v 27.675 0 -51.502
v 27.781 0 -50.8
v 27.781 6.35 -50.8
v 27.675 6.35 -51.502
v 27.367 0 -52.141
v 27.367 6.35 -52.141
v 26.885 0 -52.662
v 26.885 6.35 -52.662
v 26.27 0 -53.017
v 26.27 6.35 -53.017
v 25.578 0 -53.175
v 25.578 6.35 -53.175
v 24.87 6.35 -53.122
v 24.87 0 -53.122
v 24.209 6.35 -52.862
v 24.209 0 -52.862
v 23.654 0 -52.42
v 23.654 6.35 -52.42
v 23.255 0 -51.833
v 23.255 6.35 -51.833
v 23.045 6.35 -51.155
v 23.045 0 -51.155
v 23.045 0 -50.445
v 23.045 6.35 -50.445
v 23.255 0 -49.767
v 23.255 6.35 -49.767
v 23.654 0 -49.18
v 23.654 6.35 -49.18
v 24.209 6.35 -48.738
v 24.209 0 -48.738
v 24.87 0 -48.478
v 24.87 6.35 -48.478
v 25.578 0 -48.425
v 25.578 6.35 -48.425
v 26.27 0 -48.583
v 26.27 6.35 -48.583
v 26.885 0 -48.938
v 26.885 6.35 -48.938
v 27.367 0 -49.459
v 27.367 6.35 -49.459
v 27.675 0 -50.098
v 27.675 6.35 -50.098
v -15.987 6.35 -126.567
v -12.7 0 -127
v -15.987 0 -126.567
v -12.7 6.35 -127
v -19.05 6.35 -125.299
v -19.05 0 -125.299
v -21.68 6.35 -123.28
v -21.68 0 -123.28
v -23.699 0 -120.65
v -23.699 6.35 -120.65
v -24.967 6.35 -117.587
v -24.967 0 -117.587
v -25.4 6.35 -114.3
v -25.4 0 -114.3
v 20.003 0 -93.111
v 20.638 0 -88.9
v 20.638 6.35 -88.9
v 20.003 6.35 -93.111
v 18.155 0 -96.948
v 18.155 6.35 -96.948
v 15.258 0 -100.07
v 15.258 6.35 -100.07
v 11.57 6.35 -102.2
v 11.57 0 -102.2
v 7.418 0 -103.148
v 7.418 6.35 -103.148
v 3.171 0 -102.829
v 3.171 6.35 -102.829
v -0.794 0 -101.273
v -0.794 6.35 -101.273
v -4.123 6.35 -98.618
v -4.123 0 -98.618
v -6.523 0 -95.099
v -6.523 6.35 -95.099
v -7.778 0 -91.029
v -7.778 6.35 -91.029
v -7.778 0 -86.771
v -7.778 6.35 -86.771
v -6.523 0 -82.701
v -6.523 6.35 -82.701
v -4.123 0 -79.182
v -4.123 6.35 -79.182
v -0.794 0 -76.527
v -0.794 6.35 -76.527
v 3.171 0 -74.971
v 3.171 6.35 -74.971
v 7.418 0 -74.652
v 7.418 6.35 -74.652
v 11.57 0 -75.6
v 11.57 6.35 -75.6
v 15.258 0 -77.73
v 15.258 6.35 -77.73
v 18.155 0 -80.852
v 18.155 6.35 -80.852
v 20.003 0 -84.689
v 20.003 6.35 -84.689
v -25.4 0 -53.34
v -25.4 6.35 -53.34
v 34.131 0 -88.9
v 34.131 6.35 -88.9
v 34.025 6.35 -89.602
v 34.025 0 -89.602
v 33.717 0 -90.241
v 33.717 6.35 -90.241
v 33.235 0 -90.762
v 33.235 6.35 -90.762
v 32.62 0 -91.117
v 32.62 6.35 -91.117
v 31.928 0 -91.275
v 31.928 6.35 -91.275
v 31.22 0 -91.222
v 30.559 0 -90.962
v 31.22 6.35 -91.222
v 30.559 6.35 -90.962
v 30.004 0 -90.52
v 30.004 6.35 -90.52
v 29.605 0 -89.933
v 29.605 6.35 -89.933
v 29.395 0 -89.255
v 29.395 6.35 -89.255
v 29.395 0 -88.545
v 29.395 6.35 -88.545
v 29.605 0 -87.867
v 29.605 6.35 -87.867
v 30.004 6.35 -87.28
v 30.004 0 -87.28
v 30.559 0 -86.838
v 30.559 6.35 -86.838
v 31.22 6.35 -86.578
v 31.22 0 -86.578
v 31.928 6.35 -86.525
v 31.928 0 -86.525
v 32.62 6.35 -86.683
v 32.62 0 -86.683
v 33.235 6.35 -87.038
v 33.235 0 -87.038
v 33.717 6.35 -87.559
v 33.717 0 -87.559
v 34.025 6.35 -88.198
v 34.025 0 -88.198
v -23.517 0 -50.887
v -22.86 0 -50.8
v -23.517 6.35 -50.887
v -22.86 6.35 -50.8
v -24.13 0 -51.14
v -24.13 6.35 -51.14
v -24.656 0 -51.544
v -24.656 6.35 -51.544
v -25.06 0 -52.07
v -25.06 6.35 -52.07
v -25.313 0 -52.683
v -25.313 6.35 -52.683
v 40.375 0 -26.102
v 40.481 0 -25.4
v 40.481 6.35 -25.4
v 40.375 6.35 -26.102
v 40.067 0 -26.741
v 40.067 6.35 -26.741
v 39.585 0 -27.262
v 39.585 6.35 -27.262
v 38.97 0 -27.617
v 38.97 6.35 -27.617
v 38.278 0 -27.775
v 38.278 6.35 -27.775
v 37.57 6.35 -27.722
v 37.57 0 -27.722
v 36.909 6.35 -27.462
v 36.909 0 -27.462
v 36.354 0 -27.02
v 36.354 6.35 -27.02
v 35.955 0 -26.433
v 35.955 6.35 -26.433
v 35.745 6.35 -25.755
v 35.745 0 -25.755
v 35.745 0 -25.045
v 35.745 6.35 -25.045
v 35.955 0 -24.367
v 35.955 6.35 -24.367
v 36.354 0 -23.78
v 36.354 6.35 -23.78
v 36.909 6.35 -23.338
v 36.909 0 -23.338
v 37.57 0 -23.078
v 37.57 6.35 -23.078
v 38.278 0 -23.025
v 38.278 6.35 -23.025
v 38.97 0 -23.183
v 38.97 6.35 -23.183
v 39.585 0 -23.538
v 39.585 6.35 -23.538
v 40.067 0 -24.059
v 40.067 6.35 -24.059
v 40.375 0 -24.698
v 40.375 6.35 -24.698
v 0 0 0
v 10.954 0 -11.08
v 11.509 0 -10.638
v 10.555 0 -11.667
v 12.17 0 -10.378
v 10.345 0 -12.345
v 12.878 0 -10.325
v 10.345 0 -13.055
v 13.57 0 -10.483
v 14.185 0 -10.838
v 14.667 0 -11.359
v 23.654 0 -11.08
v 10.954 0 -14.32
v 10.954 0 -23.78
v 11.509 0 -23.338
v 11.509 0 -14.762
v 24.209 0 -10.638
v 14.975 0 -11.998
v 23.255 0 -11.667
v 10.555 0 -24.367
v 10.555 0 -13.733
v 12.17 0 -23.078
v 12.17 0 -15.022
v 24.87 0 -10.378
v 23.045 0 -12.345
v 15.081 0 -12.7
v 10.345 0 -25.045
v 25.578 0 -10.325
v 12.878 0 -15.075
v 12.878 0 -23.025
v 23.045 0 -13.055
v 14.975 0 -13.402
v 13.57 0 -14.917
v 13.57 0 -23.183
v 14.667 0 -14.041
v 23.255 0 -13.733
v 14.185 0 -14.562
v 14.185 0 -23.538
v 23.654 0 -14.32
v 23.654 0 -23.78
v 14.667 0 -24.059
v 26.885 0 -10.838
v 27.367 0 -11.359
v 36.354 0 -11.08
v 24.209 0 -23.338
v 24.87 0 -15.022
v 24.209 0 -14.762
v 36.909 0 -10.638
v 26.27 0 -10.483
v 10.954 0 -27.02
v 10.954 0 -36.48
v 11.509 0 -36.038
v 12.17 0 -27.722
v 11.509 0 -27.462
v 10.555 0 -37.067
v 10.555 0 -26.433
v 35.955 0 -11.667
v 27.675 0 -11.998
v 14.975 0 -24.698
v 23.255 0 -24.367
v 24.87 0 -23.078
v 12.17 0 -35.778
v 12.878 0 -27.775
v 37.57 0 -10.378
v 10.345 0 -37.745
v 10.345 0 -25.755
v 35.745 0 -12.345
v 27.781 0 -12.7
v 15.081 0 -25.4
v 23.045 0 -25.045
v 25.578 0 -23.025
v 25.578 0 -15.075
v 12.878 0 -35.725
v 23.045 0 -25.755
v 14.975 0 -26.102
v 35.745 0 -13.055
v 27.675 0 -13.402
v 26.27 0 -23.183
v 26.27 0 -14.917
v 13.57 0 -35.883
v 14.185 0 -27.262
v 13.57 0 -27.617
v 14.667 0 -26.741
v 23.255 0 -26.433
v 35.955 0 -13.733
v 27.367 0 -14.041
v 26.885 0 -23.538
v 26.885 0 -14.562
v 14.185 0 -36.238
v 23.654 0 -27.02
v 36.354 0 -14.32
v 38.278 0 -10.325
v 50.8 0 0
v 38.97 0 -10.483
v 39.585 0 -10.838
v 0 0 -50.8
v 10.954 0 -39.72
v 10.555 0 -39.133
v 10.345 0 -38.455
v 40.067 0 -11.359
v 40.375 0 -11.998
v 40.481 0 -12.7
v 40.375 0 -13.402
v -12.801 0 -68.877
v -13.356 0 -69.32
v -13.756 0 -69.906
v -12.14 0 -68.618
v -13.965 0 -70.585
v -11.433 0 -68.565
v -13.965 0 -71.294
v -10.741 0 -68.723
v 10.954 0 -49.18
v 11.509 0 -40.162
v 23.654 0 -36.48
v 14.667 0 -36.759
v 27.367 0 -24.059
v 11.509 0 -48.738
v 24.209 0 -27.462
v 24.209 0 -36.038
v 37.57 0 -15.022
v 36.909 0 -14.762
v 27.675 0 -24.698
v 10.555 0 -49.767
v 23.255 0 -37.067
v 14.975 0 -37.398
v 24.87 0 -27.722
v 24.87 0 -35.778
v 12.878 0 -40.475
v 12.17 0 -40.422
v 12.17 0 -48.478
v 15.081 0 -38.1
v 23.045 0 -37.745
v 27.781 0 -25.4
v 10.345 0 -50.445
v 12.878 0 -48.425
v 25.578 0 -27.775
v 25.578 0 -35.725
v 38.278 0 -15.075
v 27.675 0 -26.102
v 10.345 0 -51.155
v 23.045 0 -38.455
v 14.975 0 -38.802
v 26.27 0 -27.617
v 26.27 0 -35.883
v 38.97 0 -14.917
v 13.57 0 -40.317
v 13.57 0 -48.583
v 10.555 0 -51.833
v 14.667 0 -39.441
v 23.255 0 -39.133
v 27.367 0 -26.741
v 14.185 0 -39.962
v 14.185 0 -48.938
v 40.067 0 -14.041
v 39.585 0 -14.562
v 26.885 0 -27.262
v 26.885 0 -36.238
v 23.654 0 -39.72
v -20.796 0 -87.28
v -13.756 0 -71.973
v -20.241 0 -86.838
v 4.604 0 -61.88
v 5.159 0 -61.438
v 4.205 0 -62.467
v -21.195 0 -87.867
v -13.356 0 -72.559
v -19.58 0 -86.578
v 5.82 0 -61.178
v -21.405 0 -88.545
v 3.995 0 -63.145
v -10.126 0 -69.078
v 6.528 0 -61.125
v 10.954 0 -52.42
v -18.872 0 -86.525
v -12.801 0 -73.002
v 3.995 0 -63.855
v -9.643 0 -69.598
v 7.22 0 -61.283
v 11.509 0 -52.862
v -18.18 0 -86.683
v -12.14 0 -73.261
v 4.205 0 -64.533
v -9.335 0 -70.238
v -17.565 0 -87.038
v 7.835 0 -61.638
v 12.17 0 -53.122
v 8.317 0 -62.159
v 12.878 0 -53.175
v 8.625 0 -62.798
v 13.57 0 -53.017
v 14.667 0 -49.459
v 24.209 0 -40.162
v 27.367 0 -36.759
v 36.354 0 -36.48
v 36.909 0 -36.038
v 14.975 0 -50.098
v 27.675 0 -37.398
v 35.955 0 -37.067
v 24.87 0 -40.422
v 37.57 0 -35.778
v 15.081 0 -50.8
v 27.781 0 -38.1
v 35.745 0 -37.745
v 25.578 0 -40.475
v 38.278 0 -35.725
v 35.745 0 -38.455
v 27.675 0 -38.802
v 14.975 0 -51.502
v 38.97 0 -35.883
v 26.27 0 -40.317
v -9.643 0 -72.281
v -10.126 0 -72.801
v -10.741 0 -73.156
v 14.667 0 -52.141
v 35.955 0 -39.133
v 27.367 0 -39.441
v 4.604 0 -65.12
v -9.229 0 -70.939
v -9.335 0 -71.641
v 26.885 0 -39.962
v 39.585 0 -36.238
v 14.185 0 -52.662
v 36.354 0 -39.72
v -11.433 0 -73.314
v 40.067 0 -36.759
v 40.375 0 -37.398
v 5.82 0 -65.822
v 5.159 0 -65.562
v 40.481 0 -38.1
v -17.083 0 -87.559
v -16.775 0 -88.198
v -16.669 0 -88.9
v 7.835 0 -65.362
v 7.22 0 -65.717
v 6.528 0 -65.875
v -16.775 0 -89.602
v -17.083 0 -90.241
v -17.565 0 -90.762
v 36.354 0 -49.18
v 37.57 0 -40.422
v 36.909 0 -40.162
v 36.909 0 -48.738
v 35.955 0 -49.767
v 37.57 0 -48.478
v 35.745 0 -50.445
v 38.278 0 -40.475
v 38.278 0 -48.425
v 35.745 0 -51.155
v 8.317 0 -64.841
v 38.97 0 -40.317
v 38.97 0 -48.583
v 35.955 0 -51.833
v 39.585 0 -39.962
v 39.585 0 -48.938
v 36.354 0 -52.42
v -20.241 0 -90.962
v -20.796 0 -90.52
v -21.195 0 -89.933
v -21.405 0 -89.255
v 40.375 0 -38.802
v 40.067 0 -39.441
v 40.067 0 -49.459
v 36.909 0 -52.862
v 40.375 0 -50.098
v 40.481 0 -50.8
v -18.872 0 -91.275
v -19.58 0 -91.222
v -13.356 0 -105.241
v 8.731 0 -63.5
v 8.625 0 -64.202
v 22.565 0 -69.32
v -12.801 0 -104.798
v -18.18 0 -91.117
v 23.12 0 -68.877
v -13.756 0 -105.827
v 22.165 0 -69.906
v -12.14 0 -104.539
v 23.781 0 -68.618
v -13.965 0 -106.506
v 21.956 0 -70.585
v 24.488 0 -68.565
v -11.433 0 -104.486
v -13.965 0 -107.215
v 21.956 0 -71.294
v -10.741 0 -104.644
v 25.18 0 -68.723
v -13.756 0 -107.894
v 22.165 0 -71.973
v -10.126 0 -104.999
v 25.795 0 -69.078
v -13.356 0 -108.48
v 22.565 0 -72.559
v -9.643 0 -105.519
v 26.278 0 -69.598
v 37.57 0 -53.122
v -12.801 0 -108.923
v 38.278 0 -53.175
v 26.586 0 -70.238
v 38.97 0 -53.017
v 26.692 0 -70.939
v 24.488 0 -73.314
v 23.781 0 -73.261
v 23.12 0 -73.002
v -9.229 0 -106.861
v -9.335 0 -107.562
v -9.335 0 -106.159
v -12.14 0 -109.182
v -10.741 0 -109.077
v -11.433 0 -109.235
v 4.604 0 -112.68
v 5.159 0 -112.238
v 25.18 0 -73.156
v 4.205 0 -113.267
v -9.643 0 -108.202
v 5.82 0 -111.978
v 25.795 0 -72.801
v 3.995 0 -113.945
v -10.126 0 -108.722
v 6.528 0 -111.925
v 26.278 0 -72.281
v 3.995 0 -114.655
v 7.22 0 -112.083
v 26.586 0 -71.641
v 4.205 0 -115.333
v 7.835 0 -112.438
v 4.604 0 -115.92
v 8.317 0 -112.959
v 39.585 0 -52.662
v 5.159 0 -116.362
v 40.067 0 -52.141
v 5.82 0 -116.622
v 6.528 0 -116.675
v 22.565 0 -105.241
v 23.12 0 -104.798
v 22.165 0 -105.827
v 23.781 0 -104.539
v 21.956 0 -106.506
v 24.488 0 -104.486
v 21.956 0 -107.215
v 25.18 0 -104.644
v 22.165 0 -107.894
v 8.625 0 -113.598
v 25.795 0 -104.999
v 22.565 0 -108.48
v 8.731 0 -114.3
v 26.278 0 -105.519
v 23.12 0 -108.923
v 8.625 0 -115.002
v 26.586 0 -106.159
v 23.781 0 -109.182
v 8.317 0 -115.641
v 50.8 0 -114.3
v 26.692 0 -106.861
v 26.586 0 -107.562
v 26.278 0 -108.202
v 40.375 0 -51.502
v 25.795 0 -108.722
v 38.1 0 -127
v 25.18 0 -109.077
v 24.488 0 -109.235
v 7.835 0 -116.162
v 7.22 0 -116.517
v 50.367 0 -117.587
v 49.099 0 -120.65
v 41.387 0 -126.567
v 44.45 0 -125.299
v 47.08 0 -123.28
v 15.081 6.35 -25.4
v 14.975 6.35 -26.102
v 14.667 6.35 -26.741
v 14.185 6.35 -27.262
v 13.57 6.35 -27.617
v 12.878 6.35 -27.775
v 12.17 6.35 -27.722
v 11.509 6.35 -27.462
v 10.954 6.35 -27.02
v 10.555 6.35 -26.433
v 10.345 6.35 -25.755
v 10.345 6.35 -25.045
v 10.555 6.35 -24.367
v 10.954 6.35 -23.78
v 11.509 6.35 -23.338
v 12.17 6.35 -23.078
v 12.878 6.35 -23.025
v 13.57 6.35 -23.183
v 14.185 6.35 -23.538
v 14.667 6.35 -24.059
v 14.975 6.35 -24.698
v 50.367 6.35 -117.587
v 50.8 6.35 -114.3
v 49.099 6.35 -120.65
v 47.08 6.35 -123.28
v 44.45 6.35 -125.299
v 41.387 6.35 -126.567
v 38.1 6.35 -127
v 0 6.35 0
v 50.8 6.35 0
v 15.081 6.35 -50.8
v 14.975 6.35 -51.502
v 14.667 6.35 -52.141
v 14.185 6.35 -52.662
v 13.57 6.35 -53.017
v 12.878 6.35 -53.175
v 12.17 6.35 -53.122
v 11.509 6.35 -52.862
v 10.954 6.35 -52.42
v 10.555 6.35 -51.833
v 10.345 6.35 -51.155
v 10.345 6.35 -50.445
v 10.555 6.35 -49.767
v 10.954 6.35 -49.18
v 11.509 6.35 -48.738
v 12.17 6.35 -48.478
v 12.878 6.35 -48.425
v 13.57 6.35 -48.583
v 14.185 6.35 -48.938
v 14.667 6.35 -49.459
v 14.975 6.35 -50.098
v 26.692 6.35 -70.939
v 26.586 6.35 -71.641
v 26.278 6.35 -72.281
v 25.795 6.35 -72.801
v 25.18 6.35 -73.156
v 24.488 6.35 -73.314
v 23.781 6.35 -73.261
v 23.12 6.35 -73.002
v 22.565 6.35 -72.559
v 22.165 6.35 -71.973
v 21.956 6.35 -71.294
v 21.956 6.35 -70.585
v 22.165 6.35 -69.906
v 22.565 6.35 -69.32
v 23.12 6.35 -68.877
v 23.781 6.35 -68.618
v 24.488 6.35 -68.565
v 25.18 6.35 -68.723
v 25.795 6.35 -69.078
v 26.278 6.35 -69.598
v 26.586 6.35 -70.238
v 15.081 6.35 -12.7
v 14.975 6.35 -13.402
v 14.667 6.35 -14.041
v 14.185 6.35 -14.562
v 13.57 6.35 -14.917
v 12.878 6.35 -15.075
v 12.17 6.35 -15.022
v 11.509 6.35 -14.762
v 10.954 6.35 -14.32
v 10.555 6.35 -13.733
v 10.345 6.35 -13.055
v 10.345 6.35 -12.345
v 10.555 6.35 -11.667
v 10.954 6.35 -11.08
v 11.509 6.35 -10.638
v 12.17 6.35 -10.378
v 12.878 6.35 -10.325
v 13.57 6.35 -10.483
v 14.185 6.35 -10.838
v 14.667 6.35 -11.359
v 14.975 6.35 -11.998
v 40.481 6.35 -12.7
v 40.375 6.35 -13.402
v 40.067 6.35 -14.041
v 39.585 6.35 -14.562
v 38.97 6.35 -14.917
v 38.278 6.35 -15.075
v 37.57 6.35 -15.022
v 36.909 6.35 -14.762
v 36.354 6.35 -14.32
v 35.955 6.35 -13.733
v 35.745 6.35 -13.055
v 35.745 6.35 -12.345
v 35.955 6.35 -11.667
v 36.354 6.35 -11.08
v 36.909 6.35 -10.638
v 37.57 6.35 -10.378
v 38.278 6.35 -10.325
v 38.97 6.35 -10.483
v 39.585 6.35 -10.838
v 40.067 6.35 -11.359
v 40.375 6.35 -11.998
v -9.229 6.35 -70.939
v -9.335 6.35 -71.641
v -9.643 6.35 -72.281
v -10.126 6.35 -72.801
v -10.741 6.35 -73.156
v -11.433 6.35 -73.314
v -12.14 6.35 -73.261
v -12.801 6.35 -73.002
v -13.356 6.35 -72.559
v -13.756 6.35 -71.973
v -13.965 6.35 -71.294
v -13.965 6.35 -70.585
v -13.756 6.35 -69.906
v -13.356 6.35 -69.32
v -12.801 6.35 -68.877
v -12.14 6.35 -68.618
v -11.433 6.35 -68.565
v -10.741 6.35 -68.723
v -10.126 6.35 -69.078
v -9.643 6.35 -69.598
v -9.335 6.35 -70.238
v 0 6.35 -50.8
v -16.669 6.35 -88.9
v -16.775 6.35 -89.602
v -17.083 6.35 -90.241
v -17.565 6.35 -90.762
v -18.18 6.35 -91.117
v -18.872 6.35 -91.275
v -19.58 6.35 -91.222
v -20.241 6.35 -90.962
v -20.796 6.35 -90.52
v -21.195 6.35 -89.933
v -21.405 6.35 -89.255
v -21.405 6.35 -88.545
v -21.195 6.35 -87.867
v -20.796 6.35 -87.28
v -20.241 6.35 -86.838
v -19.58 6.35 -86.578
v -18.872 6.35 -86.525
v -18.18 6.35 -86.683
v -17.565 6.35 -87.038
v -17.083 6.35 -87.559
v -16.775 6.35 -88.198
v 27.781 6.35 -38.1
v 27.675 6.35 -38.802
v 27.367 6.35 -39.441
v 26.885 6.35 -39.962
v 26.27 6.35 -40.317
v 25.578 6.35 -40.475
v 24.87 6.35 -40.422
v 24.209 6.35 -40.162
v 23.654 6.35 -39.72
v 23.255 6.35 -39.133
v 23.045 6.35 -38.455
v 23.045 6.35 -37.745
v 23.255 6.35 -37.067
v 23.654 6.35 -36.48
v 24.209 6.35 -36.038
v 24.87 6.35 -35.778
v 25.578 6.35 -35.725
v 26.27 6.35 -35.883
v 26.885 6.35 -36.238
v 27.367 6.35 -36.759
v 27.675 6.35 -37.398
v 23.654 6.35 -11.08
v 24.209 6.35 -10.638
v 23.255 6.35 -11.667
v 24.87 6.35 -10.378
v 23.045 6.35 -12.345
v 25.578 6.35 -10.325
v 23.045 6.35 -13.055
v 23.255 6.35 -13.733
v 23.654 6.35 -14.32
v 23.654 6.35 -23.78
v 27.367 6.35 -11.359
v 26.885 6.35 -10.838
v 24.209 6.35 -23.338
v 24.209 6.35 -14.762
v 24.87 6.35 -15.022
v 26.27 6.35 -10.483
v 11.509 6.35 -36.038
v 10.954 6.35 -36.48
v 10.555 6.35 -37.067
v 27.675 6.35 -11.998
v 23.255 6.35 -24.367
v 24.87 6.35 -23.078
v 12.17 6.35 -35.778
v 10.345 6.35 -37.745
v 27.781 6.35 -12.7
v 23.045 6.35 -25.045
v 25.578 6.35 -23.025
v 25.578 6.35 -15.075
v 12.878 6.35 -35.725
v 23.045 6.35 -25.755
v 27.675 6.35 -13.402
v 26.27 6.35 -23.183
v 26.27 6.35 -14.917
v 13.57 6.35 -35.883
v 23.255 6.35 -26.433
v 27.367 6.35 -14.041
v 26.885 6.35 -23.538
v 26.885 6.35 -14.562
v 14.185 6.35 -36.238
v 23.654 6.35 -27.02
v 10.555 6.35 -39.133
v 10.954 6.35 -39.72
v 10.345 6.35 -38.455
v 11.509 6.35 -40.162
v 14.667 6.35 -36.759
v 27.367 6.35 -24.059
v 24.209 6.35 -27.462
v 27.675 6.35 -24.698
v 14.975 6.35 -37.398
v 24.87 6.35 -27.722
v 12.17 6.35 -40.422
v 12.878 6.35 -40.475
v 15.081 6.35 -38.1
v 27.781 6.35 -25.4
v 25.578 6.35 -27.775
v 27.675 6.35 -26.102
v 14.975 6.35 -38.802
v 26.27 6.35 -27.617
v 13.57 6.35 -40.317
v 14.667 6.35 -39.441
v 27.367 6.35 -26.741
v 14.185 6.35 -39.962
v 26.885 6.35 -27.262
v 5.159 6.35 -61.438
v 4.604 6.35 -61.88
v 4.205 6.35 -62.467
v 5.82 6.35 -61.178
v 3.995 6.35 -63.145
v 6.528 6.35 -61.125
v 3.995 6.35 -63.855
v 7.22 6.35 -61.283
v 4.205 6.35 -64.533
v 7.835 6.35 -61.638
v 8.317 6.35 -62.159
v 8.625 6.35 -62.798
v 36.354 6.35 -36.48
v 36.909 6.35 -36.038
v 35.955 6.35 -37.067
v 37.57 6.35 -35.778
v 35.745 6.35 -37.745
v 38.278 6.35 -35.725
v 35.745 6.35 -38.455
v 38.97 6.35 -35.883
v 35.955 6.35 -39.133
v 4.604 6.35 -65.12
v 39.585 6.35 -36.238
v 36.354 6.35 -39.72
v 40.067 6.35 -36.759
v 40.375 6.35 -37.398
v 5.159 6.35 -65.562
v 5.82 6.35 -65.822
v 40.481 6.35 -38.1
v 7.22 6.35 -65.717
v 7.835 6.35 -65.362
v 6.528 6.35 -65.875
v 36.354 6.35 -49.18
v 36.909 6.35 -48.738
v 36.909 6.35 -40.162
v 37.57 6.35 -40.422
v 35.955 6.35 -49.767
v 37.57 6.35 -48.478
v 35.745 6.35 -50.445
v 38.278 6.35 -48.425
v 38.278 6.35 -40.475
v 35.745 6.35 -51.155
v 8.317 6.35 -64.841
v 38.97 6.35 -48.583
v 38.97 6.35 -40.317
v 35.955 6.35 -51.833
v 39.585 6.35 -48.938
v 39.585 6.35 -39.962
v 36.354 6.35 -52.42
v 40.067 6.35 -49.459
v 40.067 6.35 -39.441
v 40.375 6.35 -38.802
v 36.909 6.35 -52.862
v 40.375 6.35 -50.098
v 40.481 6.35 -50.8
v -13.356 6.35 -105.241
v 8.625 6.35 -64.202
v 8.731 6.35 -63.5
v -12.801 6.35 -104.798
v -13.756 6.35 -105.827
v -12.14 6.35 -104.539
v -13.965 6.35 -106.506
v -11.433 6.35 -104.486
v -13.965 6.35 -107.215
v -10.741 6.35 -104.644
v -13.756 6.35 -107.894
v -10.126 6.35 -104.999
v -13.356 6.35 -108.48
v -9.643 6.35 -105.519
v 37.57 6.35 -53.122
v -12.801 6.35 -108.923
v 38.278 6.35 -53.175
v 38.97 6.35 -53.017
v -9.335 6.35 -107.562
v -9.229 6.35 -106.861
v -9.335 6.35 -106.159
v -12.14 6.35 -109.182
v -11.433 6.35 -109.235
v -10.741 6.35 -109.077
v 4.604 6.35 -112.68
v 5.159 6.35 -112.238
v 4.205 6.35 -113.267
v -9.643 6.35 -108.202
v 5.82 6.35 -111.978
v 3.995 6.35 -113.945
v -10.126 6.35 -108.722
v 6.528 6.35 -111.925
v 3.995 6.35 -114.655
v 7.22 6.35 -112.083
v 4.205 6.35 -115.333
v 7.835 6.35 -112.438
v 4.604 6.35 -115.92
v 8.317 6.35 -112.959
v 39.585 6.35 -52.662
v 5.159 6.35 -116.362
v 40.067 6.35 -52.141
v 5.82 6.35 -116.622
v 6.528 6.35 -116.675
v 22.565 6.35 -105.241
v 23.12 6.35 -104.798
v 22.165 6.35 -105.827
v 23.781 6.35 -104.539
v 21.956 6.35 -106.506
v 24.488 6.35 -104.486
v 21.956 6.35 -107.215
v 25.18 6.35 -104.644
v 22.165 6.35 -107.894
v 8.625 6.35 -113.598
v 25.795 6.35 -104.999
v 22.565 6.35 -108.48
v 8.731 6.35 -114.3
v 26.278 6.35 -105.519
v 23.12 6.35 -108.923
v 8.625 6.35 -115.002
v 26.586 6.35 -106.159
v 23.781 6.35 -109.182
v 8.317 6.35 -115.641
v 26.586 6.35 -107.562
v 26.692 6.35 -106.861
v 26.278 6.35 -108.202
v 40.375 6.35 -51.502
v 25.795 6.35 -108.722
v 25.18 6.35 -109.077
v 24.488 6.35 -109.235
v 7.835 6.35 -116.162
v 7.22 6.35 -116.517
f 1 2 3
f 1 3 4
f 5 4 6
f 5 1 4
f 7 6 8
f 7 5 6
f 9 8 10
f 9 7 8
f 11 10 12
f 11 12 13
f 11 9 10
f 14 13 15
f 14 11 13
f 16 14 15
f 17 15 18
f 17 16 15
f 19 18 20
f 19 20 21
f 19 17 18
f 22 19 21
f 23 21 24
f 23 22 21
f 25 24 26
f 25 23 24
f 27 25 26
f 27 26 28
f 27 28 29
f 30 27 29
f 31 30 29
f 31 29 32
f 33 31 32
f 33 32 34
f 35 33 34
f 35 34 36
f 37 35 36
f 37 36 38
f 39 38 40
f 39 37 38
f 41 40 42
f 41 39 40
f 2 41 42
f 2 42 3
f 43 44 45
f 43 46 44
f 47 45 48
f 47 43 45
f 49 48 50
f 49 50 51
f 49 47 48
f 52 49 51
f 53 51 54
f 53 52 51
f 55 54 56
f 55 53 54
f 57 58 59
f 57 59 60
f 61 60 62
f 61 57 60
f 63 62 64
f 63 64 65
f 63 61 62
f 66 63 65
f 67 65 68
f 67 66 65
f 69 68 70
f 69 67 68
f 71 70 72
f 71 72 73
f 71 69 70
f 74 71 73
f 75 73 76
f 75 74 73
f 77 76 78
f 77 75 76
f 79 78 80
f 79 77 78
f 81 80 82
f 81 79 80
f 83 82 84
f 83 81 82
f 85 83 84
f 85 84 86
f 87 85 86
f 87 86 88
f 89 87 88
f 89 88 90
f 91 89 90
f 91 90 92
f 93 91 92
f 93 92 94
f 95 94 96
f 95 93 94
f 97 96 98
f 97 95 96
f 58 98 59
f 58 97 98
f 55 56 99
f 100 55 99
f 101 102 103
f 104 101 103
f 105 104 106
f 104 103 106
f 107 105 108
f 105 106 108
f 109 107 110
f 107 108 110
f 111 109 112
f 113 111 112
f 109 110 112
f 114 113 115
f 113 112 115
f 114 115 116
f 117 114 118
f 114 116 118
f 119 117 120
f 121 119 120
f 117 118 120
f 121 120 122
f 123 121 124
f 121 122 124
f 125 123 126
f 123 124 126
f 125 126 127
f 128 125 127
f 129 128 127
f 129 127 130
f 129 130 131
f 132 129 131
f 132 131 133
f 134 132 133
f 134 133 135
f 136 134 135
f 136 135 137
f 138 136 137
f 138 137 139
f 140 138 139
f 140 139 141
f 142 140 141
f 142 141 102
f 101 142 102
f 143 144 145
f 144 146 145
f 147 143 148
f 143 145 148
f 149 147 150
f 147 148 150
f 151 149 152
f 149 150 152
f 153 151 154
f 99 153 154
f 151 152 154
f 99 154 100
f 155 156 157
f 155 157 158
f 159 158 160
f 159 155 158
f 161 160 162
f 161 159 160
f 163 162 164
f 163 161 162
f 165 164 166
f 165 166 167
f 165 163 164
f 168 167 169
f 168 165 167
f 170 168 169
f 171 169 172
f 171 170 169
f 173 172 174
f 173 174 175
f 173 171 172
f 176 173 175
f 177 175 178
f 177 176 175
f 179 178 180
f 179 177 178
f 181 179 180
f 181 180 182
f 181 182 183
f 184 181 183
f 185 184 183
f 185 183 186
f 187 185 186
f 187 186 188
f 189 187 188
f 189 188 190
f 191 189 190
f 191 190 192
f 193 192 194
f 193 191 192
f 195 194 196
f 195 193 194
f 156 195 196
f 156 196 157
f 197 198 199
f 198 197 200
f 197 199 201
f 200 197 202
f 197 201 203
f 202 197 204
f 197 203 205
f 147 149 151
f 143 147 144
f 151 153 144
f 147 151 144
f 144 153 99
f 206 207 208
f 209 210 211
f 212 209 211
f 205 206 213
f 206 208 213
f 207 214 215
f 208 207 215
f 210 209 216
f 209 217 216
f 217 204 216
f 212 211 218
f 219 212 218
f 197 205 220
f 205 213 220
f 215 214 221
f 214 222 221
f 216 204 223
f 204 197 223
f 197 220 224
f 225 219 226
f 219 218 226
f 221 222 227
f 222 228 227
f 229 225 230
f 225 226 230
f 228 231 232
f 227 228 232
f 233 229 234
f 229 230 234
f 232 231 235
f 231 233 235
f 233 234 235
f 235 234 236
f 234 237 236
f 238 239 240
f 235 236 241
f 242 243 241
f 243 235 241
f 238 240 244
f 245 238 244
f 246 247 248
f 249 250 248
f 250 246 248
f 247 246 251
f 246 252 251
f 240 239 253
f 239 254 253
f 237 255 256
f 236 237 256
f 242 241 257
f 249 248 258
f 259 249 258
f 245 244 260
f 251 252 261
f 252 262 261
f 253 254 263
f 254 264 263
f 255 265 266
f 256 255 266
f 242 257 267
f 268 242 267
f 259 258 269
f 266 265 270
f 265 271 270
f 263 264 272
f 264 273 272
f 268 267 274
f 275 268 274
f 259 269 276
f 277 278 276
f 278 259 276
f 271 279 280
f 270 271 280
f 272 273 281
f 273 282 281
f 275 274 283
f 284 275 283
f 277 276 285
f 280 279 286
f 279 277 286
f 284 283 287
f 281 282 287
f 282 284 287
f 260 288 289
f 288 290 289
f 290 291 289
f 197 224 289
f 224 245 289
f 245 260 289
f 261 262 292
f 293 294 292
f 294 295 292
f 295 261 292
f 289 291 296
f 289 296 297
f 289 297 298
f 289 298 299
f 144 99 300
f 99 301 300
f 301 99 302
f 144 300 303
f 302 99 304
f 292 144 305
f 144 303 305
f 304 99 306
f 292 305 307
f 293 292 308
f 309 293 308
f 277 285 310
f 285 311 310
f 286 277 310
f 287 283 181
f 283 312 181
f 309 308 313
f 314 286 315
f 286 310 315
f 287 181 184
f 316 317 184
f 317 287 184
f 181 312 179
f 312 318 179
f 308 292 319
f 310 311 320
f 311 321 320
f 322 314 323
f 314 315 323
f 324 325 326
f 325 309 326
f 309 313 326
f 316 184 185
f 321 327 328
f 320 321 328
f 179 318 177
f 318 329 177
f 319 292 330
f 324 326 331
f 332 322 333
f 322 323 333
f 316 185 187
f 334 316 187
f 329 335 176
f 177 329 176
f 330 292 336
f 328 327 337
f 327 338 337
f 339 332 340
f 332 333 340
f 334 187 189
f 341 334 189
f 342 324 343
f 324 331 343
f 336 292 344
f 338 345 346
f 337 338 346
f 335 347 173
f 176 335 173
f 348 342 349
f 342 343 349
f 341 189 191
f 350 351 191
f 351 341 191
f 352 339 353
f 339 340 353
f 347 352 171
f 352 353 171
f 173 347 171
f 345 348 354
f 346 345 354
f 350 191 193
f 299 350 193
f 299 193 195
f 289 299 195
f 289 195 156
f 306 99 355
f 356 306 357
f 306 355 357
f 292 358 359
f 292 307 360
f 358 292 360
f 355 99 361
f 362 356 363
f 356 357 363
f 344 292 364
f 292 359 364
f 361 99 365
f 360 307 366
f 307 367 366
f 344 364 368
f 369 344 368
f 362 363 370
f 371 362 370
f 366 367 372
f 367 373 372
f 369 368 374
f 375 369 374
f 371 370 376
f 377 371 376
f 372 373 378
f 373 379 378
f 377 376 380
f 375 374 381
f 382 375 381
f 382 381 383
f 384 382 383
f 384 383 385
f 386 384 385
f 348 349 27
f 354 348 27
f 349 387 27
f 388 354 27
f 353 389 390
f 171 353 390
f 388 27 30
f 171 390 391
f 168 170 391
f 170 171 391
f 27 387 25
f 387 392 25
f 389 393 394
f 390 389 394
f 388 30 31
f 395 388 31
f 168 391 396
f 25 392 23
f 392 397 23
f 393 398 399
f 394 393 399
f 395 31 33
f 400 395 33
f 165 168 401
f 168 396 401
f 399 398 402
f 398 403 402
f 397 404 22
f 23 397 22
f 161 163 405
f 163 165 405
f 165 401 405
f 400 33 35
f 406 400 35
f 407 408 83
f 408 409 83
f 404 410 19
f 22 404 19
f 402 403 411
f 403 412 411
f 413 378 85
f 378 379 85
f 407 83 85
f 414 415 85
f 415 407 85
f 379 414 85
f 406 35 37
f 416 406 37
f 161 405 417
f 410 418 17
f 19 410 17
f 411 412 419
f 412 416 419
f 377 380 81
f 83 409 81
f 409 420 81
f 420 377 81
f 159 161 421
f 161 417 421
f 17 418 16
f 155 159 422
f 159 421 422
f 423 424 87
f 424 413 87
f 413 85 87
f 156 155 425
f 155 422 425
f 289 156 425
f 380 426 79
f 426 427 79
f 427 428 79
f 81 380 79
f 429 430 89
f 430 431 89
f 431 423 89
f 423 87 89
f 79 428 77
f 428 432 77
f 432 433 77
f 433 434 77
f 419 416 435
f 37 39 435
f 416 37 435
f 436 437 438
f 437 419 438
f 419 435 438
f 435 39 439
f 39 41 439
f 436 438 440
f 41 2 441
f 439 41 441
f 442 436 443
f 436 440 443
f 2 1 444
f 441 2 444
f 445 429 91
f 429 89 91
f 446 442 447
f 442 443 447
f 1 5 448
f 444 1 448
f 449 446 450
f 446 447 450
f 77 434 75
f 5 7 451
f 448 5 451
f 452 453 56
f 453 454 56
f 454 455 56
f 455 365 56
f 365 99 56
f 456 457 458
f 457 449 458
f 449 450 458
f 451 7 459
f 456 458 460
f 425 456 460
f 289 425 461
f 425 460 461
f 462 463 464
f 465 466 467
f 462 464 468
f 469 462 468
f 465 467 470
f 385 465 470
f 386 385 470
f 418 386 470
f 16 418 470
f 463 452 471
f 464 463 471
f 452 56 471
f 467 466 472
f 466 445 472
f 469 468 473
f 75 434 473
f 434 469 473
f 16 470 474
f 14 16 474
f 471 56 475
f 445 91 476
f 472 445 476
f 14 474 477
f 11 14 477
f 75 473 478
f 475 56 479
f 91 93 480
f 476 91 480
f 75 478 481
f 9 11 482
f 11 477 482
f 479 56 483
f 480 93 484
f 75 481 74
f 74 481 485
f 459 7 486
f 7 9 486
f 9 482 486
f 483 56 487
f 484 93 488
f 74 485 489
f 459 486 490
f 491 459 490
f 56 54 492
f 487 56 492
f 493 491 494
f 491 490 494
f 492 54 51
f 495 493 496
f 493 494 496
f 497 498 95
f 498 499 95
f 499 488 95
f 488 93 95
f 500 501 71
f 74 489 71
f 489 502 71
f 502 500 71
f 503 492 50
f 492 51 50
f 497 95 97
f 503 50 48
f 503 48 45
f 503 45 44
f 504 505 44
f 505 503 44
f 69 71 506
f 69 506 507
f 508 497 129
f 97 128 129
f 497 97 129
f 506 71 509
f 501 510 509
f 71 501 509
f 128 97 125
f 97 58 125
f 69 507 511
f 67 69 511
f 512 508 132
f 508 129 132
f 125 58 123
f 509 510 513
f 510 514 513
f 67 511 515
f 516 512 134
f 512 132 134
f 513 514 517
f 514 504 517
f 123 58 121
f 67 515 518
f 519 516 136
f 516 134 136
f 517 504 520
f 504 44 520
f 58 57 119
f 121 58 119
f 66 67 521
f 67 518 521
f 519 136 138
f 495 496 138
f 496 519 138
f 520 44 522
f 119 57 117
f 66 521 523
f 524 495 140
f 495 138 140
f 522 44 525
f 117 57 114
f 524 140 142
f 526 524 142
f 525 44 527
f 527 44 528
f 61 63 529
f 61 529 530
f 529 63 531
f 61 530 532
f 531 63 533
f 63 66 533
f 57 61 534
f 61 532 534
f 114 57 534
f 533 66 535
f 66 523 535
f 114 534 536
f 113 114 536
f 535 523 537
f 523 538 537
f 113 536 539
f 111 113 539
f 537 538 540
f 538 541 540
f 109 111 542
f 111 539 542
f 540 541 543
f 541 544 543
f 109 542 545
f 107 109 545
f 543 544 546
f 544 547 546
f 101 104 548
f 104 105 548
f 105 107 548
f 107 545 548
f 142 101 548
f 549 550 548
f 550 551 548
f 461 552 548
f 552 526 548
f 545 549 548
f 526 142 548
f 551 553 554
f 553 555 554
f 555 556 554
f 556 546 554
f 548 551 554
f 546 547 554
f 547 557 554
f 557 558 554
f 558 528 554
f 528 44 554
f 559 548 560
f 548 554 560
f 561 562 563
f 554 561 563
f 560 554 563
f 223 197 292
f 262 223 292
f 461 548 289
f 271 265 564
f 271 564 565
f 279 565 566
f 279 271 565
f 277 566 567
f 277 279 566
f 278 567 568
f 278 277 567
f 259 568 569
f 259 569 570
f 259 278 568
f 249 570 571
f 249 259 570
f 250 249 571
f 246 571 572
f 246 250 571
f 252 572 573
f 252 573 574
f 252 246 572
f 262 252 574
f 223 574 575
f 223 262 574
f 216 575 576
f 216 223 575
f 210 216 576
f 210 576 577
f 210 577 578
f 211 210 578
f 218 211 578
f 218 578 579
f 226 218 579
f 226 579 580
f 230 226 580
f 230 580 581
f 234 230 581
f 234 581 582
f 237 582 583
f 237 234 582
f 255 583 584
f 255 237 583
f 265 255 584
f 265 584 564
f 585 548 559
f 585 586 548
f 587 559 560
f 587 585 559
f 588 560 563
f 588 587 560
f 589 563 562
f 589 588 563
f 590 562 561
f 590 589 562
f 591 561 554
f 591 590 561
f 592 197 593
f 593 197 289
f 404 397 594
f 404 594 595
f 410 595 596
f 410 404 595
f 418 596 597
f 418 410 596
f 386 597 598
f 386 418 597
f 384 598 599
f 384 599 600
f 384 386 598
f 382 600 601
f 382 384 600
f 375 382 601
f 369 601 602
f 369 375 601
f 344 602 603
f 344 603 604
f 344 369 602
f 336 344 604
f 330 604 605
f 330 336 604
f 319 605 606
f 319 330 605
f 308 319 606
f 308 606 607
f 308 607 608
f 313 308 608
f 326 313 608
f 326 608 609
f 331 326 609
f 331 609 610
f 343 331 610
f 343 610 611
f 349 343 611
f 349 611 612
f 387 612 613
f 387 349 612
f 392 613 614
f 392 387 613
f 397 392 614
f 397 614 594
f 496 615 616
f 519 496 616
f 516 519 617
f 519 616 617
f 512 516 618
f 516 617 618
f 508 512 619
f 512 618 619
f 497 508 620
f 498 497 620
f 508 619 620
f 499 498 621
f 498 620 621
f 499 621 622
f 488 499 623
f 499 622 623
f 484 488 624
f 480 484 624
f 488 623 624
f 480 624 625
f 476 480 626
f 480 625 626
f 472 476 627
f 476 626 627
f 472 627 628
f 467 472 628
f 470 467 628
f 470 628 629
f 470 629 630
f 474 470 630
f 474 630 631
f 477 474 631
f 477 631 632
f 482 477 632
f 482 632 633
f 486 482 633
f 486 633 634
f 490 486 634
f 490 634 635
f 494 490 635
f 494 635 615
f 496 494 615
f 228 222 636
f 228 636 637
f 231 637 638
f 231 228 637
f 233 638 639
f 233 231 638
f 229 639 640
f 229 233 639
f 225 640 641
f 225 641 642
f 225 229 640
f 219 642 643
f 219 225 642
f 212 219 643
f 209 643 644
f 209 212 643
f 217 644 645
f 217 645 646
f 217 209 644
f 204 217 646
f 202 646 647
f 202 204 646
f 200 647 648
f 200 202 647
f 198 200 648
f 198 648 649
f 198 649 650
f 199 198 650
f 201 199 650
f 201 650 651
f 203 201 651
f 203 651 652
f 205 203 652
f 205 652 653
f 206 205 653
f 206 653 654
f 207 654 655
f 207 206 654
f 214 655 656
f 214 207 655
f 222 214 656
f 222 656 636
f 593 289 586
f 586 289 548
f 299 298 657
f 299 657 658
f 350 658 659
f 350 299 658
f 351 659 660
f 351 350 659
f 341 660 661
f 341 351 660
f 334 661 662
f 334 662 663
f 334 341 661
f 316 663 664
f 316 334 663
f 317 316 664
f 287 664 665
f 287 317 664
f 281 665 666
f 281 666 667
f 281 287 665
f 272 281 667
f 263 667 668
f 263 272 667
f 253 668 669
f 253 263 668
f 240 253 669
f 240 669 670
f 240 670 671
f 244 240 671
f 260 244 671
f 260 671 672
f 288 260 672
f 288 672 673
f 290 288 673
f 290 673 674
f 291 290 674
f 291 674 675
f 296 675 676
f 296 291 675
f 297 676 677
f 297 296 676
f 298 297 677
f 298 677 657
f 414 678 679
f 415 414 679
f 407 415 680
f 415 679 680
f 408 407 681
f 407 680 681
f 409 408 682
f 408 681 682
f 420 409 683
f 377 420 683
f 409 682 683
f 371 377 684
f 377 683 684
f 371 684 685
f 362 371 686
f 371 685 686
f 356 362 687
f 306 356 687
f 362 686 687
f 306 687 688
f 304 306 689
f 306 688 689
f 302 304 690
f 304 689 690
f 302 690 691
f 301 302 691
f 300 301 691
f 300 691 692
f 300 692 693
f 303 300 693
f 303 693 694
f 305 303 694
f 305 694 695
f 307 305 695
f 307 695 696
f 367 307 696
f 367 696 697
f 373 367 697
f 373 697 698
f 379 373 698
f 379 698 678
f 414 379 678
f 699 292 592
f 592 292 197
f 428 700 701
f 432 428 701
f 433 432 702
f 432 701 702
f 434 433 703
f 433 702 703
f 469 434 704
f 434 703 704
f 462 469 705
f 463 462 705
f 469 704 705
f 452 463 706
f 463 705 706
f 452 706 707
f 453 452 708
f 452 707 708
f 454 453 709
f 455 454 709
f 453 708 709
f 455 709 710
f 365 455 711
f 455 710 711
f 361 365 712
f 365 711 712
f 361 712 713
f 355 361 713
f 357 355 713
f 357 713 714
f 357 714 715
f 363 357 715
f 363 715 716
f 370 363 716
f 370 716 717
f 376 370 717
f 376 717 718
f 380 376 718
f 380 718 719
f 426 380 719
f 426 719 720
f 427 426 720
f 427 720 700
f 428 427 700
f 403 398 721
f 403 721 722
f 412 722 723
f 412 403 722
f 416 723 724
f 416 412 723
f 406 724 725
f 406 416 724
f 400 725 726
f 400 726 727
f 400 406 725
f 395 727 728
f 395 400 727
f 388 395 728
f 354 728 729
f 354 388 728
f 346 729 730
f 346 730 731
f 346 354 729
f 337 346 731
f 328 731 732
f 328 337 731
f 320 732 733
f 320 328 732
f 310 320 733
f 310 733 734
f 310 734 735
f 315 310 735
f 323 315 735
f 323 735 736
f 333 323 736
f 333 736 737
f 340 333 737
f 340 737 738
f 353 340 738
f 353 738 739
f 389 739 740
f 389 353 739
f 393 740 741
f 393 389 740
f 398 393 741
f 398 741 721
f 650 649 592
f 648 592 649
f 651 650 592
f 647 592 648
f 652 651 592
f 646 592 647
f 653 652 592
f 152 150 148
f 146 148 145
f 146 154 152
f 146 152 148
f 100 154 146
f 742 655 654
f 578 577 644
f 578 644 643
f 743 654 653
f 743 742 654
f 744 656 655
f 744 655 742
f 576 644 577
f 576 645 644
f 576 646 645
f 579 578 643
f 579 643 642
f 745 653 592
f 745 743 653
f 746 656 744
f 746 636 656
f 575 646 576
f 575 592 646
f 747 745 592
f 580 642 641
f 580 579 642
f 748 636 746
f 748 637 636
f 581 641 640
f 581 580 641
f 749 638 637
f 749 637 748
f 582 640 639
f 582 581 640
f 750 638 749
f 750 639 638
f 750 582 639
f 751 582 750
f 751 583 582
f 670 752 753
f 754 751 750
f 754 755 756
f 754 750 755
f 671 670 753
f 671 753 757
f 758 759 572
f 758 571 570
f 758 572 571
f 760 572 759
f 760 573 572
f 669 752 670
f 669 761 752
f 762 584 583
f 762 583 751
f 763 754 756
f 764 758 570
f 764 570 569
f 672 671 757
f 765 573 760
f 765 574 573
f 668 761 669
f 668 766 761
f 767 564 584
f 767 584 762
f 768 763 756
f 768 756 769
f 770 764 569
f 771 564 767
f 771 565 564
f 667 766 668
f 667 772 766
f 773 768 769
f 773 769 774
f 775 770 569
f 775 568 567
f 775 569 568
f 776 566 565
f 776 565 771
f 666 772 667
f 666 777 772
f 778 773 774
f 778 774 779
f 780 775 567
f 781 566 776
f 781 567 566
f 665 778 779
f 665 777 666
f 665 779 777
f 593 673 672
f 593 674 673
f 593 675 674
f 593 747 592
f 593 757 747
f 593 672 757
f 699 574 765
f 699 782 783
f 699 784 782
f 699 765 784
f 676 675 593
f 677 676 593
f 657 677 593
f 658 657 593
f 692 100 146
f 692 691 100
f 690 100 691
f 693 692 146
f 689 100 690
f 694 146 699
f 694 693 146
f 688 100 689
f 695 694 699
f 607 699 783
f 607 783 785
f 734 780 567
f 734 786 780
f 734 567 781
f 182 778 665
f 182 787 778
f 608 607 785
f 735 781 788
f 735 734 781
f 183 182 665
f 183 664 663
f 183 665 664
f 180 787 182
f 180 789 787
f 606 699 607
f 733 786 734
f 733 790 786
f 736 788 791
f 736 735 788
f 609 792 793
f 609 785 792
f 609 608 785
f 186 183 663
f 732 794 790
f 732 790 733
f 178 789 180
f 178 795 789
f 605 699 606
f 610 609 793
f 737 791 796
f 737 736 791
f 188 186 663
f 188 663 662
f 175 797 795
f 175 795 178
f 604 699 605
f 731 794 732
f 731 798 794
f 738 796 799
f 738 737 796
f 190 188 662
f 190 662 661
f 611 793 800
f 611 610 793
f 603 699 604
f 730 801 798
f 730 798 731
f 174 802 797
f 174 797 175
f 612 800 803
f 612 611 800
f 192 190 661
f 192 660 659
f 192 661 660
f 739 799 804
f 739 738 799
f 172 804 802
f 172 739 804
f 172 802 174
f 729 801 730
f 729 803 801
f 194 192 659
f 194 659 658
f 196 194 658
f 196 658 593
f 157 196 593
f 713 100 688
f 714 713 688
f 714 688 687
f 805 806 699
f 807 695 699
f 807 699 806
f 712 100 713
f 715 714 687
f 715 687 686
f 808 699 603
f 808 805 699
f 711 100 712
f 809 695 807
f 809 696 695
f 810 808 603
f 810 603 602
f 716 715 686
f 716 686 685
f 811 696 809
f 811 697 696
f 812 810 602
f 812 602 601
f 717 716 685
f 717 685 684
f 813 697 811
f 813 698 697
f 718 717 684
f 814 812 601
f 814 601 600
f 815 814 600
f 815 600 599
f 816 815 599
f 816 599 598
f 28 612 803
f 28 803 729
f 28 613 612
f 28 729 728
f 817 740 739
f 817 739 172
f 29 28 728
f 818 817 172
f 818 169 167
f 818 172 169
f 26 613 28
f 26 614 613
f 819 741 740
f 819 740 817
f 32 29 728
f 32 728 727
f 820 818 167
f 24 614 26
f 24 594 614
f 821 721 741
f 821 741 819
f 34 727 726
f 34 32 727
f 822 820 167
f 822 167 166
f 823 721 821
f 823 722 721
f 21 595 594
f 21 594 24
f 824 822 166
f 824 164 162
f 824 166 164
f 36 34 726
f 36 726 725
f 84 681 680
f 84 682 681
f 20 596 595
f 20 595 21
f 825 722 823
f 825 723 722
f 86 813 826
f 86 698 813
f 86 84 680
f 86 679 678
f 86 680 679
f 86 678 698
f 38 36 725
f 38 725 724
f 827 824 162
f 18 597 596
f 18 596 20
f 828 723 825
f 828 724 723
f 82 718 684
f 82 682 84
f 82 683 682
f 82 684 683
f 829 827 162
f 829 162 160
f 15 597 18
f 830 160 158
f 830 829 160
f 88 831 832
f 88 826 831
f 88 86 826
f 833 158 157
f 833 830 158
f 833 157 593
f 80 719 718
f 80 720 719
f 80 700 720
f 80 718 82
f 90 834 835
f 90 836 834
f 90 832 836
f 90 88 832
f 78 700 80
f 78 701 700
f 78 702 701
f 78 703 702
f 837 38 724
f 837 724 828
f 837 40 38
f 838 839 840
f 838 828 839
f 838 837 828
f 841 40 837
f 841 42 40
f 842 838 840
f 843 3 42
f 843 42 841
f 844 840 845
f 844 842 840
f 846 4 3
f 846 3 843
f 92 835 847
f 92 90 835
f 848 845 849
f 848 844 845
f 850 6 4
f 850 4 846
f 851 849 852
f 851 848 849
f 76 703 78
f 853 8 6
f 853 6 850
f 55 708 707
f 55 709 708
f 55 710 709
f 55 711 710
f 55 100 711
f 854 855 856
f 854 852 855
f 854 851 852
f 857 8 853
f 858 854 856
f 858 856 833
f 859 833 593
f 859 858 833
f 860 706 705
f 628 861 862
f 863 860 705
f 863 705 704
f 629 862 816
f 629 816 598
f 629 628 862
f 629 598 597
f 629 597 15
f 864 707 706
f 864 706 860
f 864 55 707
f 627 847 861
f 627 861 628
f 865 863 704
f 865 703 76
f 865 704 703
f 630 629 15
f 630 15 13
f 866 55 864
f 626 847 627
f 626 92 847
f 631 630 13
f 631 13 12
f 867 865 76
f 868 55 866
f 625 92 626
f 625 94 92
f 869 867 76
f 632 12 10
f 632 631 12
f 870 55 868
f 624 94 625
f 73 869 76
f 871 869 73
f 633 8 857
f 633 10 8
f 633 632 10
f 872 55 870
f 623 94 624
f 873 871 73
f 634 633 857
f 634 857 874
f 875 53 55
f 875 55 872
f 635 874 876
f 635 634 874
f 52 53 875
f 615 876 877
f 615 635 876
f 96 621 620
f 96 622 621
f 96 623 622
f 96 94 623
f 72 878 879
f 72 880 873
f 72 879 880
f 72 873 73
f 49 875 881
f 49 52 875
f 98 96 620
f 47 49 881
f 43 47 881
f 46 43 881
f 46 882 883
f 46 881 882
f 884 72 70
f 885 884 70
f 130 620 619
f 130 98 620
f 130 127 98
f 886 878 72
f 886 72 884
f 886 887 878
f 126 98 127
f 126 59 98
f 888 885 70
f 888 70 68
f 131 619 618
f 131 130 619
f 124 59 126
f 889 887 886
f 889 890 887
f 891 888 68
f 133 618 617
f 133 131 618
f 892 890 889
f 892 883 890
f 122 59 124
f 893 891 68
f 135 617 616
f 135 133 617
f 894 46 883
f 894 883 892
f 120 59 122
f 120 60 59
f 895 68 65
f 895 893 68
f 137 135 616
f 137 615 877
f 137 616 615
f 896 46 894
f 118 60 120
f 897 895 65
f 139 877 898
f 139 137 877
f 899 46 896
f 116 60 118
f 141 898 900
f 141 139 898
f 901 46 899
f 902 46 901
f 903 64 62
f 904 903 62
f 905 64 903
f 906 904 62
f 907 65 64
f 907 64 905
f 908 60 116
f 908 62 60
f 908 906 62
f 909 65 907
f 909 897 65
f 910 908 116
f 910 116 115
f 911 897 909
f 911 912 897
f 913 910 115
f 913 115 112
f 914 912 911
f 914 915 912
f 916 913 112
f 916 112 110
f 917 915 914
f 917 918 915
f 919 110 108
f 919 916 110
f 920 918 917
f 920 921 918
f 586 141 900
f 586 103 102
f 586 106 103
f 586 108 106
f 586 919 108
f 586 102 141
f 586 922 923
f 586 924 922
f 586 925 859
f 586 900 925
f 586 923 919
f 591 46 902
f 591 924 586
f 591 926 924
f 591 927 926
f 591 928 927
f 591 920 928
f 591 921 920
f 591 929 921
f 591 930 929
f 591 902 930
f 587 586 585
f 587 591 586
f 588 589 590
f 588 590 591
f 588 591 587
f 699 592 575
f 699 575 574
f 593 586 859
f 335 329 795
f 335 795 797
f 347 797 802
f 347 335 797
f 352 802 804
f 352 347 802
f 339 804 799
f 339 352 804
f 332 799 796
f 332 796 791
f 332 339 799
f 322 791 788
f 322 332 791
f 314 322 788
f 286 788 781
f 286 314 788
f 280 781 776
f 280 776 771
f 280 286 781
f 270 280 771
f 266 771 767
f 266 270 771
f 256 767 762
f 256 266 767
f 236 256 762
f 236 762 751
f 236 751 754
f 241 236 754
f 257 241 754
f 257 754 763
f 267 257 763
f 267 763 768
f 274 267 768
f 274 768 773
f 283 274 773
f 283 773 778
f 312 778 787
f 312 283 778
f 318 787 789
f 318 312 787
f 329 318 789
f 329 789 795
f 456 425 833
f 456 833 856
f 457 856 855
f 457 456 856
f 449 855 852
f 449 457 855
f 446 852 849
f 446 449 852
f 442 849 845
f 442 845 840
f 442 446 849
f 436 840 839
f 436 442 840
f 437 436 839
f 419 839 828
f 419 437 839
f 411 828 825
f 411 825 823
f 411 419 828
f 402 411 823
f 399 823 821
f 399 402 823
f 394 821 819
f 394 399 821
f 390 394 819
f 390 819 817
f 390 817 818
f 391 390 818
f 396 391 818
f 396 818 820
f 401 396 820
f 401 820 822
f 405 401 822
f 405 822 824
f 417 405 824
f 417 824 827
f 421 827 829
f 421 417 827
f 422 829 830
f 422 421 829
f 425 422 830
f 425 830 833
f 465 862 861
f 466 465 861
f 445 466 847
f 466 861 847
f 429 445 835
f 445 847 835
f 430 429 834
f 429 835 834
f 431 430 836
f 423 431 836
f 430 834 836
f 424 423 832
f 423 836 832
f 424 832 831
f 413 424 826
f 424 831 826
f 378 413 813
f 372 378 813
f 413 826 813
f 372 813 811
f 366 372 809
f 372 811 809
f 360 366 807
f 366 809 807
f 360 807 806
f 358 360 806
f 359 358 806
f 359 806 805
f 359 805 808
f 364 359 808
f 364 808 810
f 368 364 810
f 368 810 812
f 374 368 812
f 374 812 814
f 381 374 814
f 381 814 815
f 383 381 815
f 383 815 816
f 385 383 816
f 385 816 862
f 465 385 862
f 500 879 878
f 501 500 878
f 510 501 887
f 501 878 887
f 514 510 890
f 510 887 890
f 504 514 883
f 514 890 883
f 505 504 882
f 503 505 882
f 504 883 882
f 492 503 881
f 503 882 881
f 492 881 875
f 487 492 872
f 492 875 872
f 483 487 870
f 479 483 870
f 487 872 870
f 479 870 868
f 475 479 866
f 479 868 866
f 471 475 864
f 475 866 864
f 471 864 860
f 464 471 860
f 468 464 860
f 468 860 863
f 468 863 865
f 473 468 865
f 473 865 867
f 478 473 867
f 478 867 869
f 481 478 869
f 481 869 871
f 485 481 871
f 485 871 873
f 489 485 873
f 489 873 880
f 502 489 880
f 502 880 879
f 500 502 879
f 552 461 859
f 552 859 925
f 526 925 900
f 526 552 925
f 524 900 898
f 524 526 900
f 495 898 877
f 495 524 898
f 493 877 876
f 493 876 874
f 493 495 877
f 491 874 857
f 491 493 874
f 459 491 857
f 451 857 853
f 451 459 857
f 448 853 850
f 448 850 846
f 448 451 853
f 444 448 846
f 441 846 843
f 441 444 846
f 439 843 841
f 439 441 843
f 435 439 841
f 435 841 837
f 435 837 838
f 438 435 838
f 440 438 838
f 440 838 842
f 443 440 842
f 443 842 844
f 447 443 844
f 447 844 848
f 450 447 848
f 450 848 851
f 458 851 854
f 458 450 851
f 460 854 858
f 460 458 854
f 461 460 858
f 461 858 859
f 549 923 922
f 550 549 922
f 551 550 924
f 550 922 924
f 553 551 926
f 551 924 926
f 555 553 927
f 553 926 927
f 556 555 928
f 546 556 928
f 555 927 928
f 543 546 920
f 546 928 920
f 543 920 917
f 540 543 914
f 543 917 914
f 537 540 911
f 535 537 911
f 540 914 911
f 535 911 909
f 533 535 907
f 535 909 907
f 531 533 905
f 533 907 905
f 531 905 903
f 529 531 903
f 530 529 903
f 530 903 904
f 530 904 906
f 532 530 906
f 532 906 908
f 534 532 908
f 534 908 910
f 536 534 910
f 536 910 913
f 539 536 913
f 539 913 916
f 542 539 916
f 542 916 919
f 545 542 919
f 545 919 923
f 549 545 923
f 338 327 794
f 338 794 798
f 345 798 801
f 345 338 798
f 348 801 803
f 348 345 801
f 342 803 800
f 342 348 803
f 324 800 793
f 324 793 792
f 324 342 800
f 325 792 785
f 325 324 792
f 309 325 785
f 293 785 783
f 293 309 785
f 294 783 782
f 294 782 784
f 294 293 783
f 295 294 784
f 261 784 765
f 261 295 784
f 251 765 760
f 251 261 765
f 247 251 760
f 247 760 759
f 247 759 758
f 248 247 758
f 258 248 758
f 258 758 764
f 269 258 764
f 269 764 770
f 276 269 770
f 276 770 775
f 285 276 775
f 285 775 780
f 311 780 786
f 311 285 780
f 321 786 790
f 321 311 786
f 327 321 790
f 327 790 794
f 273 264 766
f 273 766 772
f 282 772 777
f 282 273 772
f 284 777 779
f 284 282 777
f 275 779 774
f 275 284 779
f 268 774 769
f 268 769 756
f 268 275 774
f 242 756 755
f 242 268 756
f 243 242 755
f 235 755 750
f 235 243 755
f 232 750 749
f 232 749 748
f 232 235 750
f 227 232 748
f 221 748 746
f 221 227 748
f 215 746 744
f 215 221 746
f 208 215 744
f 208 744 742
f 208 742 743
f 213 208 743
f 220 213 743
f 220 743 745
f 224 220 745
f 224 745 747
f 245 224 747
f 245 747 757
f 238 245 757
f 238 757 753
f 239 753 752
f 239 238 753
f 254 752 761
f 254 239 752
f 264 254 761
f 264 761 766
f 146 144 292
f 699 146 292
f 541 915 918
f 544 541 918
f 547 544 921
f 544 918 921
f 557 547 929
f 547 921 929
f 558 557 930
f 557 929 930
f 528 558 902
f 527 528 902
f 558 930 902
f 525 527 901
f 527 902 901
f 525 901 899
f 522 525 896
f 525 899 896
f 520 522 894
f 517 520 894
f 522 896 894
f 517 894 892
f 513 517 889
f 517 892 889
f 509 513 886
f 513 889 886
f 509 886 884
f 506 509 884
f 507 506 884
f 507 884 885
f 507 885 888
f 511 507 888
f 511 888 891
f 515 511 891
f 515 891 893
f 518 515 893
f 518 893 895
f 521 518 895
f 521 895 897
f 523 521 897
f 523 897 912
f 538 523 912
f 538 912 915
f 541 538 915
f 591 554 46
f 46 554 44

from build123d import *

# Parameters (mm, degrees)
SKETCH1_R           = 2.38125
SKETCH1_R_2         = 14.2875
BOSS_EXTRUDE1_DEPTH = 6.35
FILLET1_R           = 12.7
SKETCH2_R           = 2.38125
CUT_EXTRUDE1_DEPTH  = 7.35
FILLET2_R           = 2.54


with BuildPart() as part:
    # Sketch1 → Boss-Extrude1 (new body)
    with BuildSketch(Plane(origin=(0, 0, 0), x_dir=(1, 0, 0), z_dir=(0, 1, 0))):
        Polygon((0, 0), (50.8, 0), (50.8, 127), (-25.4, 127), (-25.4, 50.8), (0, 50.8), align=None)
        with Locations((12.7, 12.7)):
            Circle(SKETCH1_R, mode=Mode.SUBTRACT)
        with Locations((25.4, 12.7)):
            Circle(SKETCH1_R, mode=Mode.SUBTRACT)
        with Locations((38.1, 12.7)):
            Circle(SKETCH1_R, mode=Mode.SUBTRACT)
        with Locations((25.4, 25.4)):
            Circle(SKETCH1_R, mode=Mode.SUBTRACT)
        with Locations((38.1, 25.4)):
            Circle(SKETCH1_R, mode=Mode.SUBTRACT)
        with Locations((25.4, 38.1)):
            Circle(SKETCH1_R, mode=Mode.SUBTRACT)
        with Locations((38.1, 38.1)):
            Circle(SKETCH1_R, mode=Mode.SUBTRACT)
        with Locations((12.7, 25.4)):
            Circle(SKETCH1_R, mode=Mode.SUBTRACT)
        with Locations((12.7, 38.1)):
            Circle(SKETCH1_R, mode=Mode.SUBTRACT)
        with Locations((6.35, 88.9)):
            Circle(SKETCH1_R_2, mode=Mode.SUBTRACT)
        with Locations((12.7, 50.8)):
            Circle(SKETCH1_R, mode=Mode.SUBTRACT)
        with Locations((25.4, 50.8)):
            Circle(SKETCH1_R, mode=Mode.SUBTRACT)
        with Locations((38.1, 50.8)):
            Circle(SKETCH1_R, mode=Mode.SUBTRACT)
    extrude(amount=BOSS_EXTRUDE1_DEPTH)

    # Fillet1
    fillet1_edges = [part.edges().sort_by_distance(p)[0] for p in [
        (-25.4, 3.175, -127),
        (50.8, 3.175, -127),
    ]]
    fillet(fillet1_edges, radius=FILLET1_R)

    # Sketch2 → Cut-Extrude1 (cut, through all)
    with BuildSketch(Plane(origin=(0, 6.35, 0), x_dir=(1, 0, 0), z_dir=(0, 1, 0))):
        with Locations((-19.05, 88.9)):
            Circle(SKETCH2_R)
        with Locations((-11.610512242, 106.860512242)):
            Circle(SKETCH2_R)
        with Locations((6.35, 114.3)):
            Circle(SKETCH2_R)
        with Locations((24.310512242, 106.860512242)):
            Circle(SKETCH2_R)
        with Locations((31.75, 88.9)):
            Circle(SKETCH2_R)
        with Locations((24.310512242, 70.939487758)):
            Circle(SKETCH2_R)
        with Locations((6.35, 63.5)):
            Circle(SKETCH2_R)
        with Locations((-11.610512242, 70.939487758)):
            Circle(SKETCH2_R)
    extrude(amount=-CUT_EXTRUDE1_DEPTH, mode=Mode.SUBTRACT)

    # Fillet2
    fillet2_edges = [part.edges().sort_by_distance(p)[0] for p in [
        (-25.4, 3.175, -50.8),
    ]]
    fillet(fillet2_edges, radius=FILLET2_R)


solid = part.part
